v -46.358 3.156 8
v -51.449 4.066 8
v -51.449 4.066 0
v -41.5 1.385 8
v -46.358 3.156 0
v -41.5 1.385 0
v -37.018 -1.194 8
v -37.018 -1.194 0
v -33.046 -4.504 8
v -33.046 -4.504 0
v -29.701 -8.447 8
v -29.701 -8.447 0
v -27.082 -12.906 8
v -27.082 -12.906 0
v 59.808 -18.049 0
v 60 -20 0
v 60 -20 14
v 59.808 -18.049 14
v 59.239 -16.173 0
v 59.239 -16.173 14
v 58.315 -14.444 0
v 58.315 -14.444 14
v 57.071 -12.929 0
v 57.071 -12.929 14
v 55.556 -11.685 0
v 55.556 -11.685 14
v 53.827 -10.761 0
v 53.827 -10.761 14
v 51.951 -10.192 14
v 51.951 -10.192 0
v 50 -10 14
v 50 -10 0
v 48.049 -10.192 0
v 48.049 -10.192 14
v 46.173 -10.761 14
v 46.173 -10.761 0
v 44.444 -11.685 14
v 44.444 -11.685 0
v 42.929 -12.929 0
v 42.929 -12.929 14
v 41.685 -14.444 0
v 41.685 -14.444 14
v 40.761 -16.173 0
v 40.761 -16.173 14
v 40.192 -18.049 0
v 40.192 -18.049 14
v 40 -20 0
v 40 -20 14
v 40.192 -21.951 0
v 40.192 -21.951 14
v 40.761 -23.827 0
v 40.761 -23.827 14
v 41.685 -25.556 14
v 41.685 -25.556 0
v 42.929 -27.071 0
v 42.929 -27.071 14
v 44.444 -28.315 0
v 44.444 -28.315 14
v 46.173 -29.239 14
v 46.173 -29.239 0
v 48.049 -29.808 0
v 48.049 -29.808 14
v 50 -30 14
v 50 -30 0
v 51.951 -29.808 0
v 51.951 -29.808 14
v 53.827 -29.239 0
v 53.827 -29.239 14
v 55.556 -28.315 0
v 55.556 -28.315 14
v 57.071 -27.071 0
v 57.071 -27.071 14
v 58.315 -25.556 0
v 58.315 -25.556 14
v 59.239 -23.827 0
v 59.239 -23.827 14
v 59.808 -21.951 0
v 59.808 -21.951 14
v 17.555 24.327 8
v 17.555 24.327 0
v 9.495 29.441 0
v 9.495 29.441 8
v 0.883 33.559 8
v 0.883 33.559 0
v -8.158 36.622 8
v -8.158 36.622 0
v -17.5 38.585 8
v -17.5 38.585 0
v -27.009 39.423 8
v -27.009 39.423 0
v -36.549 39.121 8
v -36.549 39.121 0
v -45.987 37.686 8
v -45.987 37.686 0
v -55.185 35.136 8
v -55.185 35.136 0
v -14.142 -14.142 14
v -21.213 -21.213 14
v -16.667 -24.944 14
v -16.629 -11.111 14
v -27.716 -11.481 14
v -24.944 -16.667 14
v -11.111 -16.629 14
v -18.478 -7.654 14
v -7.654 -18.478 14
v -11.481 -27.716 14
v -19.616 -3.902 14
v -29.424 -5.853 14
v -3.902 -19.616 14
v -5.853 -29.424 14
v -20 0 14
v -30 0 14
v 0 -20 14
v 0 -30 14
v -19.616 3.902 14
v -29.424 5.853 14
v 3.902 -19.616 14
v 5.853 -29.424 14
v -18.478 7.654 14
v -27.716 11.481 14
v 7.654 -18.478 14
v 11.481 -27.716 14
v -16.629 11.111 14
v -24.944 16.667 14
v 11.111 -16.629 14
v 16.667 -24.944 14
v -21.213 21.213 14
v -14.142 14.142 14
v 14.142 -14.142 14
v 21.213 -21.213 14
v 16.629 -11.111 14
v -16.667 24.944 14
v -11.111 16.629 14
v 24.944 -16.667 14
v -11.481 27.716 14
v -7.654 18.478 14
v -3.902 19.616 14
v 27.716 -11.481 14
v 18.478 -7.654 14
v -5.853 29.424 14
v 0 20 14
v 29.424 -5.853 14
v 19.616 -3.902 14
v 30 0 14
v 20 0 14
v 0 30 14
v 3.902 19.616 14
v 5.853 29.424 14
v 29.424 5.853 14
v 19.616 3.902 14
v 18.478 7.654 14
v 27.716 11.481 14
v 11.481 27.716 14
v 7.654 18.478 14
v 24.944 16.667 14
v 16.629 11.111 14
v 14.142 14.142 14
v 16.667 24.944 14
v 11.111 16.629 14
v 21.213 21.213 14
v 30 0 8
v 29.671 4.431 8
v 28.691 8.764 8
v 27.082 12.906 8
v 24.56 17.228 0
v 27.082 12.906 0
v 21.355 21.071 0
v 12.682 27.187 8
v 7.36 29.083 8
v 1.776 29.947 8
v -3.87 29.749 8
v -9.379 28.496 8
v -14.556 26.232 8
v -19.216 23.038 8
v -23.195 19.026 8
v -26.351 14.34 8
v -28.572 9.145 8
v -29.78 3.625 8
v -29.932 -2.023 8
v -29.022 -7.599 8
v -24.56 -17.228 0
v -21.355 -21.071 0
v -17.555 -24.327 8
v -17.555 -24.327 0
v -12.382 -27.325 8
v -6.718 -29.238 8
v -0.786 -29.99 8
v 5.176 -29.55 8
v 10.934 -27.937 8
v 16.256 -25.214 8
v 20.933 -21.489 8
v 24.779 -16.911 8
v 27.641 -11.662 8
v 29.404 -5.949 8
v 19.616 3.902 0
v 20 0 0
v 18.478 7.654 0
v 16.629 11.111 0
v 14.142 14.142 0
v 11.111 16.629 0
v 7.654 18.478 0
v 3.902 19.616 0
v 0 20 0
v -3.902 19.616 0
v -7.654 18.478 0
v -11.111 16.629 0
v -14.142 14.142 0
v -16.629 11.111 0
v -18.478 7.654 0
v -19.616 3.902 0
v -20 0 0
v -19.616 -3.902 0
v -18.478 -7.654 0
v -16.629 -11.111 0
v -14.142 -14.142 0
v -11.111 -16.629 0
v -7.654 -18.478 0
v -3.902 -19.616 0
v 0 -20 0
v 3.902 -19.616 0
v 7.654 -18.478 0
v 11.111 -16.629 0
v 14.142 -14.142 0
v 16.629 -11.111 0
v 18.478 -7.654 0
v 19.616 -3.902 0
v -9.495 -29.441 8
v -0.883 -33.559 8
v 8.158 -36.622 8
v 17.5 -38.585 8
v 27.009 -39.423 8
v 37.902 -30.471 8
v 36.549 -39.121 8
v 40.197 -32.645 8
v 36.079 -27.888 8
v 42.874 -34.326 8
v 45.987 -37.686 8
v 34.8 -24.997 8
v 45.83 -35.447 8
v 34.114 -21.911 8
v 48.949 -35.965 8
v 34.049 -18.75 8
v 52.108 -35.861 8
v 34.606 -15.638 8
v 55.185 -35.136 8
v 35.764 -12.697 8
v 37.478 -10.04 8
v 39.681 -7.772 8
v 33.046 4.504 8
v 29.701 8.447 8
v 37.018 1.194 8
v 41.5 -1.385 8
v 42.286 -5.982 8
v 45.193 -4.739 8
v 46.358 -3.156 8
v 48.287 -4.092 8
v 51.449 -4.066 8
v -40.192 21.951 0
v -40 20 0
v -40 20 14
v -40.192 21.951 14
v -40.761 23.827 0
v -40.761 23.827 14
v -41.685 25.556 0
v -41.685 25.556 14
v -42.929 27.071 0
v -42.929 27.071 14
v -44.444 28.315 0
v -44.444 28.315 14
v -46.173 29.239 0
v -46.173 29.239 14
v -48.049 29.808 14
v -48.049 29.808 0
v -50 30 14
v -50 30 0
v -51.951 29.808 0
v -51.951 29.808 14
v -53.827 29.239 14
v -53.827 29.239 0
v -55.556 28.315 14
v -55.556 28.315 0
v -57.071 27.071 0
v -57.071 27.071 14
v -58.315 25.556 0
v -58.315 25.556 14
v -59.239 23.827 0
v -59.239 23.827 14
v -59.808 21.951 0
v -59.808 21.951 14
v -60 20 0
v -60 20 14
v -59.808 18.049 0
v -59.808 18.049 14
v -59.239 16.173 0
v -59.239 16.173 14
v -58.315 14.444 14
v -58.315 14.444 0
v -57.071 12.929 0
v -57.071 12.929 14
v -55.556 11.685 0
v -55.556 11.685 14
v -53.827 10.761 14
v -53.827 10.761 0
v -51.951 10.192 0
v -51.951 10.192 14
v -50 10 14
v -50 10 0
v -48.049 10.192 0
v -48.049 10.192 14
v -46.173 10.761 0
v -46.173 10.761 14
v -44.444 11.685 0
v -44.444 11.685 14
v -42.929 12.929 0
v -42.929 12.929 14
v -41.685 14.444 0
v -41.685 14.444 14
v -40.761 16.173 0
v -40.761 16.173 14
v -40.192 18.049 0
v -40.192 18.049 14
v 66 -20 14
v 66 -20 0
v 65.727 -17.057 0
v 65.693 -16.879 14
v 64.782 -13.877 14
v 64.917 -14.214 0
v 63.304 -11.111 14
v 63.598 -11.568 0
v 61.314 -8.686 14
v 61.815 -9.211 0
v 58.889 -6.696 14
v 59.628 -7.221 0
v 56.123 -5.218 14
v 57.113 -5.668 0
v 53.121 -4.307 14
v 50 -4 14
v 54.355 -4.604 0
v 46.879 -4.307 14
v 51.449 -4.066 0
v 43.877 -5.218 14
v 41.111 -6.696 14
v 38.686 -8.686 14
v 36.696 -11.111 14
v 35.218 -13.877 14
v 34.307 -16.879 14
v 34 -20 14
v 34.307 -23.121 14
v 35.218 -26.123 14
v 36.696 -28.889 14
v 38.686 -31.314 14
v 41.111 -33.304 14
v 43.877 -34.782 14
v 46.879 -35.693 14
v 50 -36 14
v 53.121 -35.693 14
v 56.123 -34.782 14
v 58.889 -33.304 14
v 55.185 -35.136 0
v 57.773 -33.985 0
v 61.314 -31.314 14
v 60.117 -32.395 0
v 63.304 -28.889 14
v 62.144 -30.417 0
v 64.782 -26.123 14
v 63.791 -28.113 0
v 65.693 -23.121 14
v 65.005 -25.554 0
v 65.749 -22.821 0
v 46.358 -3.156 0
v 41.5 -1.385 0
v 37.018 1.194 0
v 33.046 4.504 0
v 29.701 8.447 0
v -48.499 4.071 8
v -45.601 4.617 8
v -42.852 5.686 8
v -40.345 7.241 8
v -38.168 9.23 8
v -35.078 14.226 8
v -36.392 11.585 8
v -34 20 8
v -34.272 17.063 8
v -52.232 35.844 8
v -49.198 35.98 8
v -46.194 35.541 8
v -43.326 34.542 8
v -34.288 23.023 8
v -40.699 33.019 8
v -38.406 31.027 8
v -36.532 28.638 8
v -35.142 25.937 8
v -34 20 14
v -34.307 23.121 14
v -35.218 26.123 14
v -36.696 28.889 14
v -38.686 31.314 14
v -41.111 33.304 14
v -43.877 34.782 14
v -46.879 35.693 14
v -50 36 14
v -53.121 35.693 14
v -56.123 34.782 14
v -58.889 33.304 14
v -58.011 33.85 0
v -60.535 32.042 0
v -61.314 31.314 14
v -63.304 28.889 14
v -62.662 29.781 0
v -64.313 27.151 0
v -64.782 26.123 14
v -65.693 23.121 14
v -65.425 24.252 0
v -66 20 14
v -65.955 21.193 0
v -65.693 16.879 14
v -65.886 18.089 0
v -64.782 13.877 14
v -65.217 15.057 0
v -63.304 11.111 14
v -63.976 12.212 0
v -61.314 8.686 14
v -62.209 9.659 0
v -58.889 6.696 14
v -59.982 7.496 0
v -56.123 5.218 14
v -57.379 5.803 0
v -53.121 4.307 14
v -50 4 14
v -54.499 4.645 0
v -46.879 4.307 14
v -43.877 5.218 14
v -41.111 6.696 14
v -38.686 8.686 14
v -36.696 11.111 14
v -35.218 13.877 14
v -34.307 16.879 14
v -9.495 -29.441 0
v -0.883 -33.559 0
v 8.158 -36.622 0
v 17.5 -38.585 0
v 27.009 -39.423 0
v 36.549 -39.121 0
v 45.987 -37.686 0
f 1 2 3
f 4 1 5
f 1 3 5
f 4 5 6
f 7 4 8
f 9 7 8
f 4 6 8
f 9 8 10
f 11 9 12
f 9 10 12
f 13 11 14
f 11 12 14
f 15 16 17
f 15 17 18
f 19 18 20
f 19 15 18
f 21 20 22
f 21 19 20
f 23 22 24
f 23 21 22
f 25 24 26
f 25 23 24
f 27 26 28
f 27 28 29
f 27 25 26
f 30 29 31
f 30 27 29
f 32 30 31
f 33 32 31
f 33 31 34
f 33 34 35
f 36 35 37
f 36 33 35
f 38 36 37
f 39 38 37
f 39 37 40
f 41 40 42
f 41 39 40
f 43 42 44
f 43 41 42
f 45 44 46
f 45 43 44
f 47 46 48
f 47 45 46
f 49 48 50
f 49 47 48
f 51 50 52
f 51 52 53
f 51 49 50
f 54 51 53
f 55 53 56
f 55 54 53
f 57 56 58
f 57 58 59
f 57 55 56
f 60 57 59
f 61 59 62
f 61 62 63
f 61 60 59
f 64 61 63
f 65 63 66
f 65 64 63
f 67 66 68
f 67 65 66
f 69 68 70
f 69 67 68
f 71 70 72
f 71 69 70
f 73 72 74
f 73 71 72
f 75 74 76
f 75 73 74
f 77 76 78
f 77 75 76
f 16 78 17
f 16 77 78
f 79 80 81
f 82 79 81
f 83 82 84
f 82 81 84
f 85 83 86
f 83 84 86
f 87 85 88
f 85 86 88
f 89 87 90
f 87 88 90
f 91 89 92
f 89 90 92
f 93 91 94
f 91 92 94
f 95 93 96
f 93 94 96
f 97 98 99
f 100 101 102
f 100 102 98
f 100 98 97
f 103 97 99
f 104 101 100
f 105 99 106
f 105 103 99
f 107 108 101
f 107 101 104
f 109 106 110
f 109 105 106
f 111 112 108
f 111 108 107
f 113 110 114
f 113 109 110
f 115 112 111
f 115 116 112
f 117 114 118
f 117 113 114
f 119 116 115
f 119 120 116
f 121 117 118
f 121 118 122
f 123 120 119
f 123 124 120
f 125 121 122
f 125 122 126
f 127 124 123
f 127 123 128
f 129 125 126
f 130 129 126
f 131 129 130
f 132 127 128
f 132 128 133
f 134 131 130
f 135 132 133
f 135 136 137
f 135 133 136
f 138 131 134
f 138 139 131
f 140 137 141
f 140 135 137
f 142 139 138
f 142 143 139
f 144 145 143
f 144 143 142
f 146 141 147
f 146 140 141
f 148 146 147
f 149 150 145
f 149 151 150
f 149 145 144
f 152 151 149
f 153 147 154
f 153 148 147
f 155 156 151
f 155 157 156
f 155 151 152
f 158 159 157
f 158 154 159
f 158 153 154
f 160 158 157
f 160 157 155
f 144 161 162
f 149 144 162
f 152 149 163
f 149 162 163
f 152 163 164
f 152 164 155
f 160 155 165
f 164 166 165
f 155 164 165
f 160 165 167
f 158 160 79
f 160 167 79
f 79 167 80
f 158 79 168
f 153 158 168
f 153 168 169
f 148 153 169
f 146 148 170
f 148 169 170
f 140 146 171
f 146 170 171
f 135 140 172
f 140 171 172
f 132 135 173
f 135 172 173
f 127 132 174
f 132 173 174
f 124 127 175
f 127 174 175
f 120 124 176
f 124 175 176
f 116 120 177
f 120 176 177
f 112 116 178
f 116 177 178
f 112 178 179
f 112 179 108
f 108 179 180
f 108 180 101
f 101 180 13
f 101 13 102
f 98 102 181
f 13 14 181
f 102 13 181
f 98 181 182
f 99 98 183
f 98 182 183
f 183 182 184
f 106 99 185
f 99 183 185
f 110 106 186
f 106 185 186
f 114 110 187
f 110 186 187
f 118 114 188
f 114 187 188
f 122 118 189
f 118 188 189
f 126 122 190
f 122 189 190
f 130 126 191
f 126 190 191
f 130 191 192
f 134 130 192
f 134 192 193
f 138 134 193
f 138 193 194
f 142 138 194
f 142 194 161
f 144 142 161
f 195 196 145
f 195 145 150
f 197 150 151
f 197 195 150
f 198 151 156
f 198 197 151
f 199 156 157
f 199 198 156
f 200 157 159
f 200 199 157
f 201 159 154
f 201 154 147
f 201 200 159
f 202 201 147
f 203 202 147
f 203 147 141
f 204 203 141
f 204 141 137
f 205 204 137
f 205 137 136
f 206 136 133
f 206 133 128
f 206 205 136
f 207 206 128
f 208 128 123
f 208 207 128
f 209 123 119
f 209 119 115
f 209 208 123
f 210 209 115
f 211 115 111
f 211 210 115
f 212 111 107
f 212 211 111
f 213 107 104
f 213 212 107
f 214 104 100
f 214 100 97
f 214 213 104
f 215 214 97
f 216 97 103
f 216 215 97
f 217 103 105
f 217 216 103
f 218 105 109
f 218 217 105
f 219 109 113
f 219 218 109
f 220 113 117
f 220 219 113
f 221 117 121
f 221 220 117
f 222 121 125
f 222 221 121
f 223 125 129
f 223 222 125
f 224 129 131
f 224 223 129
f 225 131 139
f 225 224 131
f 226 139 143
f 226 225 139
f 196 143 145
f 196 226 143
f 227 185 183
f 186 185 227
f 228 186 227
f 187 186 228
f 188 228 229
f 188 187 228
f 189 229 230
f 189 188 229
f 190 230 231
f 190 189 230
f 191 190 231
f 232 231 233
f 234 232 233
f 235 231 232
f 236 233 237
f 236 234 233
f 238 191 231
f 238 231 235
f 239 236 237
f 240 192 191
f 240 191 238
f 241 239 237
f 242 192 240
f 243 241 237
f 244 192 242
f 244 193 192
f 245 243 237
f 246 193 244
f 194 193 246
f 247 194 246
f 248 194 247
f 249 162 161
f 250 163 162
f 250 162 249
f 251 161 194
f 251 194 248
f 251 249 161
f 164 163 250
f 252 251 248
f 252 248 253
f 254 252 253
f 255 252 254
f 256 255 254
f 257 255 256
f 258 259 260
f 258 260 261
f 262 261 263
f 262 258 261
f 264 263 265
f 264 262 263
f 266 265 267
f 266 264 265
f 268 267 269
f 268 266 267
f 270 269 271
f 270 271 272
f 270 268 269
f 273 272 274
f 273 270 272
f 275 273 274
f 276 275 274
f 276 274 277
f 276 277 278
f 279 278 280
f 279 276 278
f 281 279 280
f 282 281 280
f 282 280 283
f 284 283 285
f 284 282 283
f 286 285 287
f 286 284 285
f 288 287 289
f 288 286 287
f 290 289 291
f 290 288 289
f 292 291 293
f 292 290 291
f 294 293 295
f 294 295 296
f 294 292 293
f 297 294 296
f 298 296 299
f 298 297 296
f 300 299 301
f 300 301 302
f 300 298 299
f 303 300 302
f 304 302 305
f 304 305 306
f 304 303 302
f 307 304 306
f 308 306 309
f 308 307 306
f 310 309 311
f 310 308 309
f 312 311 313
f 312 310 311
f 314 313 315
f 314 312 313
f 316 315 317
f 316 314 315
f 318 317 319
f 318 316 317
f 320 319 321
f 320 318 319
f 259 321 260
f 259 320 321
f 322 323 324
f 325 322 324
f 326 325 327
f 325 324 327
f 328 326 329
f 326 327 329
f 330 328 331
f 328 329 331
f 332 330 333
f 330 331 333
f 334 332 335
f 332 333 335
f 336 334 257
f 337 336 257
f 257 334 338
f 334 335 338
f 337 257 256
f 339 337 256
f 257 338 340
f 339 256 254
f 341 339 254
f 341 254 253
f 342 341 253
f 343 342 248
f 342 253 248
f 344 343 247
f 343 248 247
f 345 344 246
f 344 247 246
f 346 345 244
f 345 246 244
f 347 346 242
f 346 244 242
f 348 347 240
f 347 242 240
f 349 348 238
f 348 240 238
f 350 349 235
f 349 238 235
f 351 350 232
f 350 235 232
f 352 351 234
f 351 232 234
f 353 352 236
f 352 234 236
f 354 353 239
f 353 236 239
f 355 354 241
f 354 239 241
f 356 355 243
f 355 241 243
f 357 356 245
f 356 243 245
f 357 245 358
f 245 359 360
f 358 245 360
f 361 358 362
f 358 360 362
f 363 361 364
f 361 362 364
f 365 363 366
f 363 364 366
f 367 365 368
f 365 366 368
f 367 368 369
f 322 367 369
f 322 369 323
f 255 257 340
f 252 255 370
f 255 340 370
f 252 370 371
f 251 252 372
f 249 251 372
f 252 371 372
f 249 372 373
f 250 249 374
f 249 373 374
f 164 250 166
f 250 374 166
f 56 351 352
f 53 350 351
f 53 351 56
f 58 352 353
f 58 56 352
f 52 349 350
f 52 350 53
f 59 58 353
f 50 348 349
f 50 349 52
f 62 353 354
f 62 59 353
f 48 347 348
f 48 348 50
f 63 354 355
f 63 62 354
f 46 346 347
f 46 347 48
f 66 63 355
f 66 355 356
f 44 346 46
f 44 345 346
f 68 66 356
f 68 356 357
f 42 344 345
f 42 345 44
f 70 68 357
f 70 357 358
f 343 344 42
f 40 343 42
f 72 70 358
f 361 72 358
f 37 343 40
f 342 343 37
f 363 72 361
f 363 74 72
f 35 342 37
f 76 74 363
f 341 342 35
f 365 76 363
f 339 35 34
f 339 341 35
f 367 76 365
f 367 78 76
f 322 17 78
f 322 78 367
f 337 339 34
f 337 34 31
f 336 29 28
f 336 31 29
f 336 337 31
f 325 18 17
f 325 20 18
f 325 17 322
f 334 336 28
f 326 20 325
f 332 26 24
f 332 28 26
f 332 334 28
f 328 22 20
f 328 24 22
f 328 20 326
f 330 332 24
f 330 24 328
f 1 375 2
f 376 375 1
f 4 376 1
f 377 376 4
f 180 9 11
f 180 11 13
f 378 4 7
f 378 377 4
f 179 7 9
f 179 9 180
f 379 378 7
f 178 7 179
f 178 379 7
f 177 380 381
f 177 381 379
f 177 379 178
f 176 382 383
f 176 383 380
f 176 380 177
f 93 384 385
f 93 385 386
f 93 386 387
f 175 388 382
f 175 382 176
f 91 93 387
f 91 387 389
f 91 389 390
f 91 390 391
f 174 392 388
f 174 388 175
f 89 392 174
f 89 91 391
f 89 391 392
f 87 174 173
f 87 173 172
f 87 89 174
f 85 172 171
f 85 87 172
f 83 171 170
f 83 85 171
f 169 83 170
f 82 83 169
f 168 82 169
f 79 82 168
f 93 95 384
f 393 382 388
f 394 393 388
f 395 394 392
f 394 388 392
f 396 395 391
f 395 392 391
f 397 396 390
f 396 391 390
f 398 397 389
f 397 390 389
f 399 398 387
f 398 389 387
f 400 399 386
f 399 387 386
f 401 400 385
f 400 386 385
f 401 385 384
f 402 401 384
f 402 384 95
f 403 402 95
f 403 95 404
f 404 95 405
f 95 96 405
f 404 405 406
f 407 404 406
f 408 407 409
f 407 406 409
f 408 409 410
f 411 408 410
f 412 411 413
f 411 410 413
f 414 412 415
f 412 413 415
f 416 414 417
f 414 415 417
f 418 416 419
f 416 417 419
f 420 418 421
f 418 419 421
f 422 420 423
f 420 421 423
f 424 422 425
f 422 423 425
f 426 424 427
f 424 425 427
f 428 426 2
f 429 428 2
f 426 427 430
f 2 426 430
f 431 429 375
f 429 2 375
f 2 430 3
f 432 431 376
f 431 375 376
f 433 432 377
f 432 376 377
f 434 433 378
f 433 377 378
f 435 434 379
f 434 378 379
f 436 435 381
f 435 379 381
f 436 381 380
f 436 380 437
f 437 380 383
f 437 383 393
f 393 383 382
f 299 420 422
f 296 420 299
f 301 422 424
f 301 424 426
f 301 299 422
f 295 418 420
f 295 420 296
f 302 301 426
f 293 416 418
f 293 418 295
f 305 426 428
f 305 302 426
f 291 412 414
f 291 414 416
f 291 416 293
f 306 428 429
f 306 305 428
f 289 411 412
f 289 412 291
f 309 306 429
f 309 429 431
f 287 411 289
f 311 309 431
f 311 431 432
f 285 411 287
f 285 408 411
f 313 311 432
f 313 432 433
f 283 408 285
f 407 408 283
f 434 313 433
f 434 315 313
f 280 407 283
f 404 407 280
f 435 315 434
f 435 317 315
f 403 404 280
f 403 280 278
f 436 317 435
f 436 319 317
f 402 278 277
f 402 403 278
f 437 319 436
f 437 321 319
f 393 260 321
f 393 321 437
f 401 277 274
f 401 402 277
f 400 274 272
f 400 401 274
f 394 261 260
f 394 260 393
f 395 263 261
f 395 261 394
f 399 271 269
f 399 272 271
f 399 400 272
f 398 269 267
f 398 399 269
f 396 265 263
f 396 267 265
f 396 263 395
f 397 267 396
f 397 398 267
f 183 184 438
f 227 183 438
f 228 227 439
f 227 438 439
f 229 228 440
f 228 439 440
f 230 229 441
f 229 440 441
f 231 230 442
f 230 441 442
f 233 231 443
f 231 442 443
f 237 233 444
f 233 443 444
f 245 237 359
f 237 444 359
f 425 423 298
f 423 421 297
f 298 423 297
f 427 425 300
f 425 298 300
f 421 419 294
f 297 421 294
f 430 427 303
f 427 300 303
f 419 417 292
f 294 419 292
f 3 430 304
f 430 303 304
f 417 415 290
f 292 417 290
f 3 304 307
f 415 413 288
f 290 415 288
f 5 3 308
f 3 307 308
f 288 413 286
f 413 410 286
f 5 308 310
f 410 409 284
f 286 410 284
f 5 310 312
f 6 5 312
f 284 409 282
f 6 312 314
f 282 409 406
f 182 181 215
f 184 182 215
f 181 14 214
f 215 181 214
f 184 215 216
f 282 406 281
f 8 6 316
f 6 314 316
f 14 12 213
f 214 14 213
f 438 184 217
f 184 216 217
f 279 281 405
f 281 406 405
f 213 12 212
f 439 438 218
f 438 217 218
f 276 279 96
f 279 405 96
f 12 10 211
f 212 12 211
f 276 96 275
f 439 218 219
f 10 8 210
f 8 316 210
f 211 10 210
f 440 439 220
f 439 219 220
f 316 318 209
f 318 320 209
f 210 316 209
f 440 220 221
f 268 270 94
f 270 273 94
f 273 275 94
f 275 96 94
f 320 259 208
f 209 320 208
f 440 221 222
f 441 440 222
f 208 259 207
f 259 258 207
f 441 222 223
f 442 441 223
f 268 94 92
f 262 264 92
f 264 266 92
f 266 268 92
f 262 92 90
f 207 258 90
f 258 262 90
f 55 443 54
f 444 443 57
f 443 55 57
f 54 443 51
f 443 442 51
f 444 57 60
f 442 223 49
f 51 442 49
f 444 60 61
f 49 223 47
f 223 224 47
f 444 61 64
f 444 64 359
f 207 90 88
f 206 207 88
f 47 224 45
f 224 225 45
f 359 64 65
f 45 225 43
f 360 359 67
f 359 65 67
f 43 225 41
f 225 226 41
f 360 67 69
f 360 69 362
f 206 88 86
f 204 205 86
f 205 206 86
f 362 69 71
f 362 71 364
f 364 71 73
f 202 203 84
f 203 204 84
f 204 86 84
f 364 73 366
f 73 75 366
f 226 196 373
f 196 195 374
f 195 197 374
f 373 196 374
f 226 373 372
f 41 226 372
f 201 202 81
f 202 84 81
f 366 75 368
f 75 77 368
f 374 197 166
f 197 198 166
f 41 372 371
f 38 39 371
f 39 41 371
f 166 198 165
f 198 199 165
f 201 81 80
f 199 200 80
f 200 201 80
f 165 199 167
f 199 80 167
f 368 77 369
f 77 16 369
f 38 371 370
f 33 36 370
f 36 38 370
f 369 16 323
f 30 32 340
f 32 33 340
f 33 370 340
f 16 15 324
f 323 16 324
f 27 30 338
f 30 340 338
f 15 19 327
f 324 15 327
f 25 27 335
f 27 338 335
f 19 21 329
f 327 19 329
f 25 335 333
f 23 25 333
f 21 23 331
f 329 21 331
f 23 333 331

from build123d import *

# Parameters (mm, degrees)
SCHIZZO1_R                     = 30
SCHIZZO1_R_2                   = 20
ESTRUSIONE_ESTRUSIONE1_DEPTH   = 14
SCHIZZO1_R_3                   = 16
SCHIZZO1_R_4                   = 10
ESTRUSIONE_ESTRUSIONE1_2_DEPTH = 14
ESTRUSIONE_ESTRUSIONE1_3_DEPTH = 14
ESTRUSIONE_ESTRUSIONE2_DEPTH   = 8


with BuildPart() as part:
    # Schizzo1 → Estrusione-Estrusione1 (new body)
    with BuildSketch(Plane.XY):
        Circle(SCHIZZO1_R)
        Circle(SCHIZZO1_R_2, mode=Mode.SUBTRACT)
    extrude(amount=ESTRUSIONE_ESTRUSIONE1_DEPTH)



with BuildPart() as body_2:
    # Schizzo1 → Estrusione-Estrusione1 2 (new body)
    with BuildSketch(Plane.XY):
        with Locations((50, -20)):
            Circle(SCHIZZO1_R_3)
        with Locations((50, -20)):
            Circle(SCHIZZO1_R_4, mode=Mode.SUBTRACT)
    extrude(amount=ESTRUSIONE_ESTRUSIONE1_2_DEPTH)


with BuildPart() as body_3:
    # Schizzo1 → Estrusione-Estrusione1 3 (new body)
    with BuildSketch(Plane.XY):
        with Locations((-50, 20)):
            Circle(SCHIZZO1_R_3)
        with Locations((-50, 20)):
            Circle(SCHIZZO1_R_4, mode=Mode.SUBTRACT)
    extrude(amount=ESTRUSIONE_ESTRUSIONE1_3_DEPTH)


with BuildPart() as part_1:
    add(part.part)

    add(body_2.part)  # Estrusione-Estrusione2 merges body 2

    add(body_3.part)  # Estrusione-Estrusione2 merges body 3
    # Schizzo1<3> → Estrusione-Estrusione2 (add)
    with BuildSketch(Plane.XY):
        with BuildLine():
            ThreePointArc((27.082221172, 12.905552929), (19.216285693, -23.037672716), (-17.554966307, -24.327415768))
            ThreePointArc((-17.554966307, -24.327415768), (17.499627211, -38.585427044), (55.185430705, -35.136423237))
            ThreePointArc((55.185430705, -35.136423237), (34.114481769, -21.910578587), (51.448501685, -4.06570231))
            ThreePointArc((51.448501685, -4.06570231), (37.018349838, 1.193804792), (27.082221172, 12.905552929))
        make_face()
        with BuildLine():
            ThreePointArc((-27.082221172, -12.905552929), (-19.216285693, 23.037672716), (17.554966307, 24.327415768))
            ThreePointArc((17.554966307, 24.327415768), (-17.499627211, 38.585427044), (-55.185430705, 35.136423237))
            ThreePointArc((-55.185430705, 35.136423237), (-34.114481769, 21.910578587), (-51.448501685, 4.06570231))
            ThreePointArc((-51.448501685, 4.06570231), (-37.018349838, -1.193804792), (-27.082221172, -12.905552929))
        make_face()
    extrude(amount=ESTRUSIONE_ESTRUSIONE2_DEPTH)


solid = part_1.part
